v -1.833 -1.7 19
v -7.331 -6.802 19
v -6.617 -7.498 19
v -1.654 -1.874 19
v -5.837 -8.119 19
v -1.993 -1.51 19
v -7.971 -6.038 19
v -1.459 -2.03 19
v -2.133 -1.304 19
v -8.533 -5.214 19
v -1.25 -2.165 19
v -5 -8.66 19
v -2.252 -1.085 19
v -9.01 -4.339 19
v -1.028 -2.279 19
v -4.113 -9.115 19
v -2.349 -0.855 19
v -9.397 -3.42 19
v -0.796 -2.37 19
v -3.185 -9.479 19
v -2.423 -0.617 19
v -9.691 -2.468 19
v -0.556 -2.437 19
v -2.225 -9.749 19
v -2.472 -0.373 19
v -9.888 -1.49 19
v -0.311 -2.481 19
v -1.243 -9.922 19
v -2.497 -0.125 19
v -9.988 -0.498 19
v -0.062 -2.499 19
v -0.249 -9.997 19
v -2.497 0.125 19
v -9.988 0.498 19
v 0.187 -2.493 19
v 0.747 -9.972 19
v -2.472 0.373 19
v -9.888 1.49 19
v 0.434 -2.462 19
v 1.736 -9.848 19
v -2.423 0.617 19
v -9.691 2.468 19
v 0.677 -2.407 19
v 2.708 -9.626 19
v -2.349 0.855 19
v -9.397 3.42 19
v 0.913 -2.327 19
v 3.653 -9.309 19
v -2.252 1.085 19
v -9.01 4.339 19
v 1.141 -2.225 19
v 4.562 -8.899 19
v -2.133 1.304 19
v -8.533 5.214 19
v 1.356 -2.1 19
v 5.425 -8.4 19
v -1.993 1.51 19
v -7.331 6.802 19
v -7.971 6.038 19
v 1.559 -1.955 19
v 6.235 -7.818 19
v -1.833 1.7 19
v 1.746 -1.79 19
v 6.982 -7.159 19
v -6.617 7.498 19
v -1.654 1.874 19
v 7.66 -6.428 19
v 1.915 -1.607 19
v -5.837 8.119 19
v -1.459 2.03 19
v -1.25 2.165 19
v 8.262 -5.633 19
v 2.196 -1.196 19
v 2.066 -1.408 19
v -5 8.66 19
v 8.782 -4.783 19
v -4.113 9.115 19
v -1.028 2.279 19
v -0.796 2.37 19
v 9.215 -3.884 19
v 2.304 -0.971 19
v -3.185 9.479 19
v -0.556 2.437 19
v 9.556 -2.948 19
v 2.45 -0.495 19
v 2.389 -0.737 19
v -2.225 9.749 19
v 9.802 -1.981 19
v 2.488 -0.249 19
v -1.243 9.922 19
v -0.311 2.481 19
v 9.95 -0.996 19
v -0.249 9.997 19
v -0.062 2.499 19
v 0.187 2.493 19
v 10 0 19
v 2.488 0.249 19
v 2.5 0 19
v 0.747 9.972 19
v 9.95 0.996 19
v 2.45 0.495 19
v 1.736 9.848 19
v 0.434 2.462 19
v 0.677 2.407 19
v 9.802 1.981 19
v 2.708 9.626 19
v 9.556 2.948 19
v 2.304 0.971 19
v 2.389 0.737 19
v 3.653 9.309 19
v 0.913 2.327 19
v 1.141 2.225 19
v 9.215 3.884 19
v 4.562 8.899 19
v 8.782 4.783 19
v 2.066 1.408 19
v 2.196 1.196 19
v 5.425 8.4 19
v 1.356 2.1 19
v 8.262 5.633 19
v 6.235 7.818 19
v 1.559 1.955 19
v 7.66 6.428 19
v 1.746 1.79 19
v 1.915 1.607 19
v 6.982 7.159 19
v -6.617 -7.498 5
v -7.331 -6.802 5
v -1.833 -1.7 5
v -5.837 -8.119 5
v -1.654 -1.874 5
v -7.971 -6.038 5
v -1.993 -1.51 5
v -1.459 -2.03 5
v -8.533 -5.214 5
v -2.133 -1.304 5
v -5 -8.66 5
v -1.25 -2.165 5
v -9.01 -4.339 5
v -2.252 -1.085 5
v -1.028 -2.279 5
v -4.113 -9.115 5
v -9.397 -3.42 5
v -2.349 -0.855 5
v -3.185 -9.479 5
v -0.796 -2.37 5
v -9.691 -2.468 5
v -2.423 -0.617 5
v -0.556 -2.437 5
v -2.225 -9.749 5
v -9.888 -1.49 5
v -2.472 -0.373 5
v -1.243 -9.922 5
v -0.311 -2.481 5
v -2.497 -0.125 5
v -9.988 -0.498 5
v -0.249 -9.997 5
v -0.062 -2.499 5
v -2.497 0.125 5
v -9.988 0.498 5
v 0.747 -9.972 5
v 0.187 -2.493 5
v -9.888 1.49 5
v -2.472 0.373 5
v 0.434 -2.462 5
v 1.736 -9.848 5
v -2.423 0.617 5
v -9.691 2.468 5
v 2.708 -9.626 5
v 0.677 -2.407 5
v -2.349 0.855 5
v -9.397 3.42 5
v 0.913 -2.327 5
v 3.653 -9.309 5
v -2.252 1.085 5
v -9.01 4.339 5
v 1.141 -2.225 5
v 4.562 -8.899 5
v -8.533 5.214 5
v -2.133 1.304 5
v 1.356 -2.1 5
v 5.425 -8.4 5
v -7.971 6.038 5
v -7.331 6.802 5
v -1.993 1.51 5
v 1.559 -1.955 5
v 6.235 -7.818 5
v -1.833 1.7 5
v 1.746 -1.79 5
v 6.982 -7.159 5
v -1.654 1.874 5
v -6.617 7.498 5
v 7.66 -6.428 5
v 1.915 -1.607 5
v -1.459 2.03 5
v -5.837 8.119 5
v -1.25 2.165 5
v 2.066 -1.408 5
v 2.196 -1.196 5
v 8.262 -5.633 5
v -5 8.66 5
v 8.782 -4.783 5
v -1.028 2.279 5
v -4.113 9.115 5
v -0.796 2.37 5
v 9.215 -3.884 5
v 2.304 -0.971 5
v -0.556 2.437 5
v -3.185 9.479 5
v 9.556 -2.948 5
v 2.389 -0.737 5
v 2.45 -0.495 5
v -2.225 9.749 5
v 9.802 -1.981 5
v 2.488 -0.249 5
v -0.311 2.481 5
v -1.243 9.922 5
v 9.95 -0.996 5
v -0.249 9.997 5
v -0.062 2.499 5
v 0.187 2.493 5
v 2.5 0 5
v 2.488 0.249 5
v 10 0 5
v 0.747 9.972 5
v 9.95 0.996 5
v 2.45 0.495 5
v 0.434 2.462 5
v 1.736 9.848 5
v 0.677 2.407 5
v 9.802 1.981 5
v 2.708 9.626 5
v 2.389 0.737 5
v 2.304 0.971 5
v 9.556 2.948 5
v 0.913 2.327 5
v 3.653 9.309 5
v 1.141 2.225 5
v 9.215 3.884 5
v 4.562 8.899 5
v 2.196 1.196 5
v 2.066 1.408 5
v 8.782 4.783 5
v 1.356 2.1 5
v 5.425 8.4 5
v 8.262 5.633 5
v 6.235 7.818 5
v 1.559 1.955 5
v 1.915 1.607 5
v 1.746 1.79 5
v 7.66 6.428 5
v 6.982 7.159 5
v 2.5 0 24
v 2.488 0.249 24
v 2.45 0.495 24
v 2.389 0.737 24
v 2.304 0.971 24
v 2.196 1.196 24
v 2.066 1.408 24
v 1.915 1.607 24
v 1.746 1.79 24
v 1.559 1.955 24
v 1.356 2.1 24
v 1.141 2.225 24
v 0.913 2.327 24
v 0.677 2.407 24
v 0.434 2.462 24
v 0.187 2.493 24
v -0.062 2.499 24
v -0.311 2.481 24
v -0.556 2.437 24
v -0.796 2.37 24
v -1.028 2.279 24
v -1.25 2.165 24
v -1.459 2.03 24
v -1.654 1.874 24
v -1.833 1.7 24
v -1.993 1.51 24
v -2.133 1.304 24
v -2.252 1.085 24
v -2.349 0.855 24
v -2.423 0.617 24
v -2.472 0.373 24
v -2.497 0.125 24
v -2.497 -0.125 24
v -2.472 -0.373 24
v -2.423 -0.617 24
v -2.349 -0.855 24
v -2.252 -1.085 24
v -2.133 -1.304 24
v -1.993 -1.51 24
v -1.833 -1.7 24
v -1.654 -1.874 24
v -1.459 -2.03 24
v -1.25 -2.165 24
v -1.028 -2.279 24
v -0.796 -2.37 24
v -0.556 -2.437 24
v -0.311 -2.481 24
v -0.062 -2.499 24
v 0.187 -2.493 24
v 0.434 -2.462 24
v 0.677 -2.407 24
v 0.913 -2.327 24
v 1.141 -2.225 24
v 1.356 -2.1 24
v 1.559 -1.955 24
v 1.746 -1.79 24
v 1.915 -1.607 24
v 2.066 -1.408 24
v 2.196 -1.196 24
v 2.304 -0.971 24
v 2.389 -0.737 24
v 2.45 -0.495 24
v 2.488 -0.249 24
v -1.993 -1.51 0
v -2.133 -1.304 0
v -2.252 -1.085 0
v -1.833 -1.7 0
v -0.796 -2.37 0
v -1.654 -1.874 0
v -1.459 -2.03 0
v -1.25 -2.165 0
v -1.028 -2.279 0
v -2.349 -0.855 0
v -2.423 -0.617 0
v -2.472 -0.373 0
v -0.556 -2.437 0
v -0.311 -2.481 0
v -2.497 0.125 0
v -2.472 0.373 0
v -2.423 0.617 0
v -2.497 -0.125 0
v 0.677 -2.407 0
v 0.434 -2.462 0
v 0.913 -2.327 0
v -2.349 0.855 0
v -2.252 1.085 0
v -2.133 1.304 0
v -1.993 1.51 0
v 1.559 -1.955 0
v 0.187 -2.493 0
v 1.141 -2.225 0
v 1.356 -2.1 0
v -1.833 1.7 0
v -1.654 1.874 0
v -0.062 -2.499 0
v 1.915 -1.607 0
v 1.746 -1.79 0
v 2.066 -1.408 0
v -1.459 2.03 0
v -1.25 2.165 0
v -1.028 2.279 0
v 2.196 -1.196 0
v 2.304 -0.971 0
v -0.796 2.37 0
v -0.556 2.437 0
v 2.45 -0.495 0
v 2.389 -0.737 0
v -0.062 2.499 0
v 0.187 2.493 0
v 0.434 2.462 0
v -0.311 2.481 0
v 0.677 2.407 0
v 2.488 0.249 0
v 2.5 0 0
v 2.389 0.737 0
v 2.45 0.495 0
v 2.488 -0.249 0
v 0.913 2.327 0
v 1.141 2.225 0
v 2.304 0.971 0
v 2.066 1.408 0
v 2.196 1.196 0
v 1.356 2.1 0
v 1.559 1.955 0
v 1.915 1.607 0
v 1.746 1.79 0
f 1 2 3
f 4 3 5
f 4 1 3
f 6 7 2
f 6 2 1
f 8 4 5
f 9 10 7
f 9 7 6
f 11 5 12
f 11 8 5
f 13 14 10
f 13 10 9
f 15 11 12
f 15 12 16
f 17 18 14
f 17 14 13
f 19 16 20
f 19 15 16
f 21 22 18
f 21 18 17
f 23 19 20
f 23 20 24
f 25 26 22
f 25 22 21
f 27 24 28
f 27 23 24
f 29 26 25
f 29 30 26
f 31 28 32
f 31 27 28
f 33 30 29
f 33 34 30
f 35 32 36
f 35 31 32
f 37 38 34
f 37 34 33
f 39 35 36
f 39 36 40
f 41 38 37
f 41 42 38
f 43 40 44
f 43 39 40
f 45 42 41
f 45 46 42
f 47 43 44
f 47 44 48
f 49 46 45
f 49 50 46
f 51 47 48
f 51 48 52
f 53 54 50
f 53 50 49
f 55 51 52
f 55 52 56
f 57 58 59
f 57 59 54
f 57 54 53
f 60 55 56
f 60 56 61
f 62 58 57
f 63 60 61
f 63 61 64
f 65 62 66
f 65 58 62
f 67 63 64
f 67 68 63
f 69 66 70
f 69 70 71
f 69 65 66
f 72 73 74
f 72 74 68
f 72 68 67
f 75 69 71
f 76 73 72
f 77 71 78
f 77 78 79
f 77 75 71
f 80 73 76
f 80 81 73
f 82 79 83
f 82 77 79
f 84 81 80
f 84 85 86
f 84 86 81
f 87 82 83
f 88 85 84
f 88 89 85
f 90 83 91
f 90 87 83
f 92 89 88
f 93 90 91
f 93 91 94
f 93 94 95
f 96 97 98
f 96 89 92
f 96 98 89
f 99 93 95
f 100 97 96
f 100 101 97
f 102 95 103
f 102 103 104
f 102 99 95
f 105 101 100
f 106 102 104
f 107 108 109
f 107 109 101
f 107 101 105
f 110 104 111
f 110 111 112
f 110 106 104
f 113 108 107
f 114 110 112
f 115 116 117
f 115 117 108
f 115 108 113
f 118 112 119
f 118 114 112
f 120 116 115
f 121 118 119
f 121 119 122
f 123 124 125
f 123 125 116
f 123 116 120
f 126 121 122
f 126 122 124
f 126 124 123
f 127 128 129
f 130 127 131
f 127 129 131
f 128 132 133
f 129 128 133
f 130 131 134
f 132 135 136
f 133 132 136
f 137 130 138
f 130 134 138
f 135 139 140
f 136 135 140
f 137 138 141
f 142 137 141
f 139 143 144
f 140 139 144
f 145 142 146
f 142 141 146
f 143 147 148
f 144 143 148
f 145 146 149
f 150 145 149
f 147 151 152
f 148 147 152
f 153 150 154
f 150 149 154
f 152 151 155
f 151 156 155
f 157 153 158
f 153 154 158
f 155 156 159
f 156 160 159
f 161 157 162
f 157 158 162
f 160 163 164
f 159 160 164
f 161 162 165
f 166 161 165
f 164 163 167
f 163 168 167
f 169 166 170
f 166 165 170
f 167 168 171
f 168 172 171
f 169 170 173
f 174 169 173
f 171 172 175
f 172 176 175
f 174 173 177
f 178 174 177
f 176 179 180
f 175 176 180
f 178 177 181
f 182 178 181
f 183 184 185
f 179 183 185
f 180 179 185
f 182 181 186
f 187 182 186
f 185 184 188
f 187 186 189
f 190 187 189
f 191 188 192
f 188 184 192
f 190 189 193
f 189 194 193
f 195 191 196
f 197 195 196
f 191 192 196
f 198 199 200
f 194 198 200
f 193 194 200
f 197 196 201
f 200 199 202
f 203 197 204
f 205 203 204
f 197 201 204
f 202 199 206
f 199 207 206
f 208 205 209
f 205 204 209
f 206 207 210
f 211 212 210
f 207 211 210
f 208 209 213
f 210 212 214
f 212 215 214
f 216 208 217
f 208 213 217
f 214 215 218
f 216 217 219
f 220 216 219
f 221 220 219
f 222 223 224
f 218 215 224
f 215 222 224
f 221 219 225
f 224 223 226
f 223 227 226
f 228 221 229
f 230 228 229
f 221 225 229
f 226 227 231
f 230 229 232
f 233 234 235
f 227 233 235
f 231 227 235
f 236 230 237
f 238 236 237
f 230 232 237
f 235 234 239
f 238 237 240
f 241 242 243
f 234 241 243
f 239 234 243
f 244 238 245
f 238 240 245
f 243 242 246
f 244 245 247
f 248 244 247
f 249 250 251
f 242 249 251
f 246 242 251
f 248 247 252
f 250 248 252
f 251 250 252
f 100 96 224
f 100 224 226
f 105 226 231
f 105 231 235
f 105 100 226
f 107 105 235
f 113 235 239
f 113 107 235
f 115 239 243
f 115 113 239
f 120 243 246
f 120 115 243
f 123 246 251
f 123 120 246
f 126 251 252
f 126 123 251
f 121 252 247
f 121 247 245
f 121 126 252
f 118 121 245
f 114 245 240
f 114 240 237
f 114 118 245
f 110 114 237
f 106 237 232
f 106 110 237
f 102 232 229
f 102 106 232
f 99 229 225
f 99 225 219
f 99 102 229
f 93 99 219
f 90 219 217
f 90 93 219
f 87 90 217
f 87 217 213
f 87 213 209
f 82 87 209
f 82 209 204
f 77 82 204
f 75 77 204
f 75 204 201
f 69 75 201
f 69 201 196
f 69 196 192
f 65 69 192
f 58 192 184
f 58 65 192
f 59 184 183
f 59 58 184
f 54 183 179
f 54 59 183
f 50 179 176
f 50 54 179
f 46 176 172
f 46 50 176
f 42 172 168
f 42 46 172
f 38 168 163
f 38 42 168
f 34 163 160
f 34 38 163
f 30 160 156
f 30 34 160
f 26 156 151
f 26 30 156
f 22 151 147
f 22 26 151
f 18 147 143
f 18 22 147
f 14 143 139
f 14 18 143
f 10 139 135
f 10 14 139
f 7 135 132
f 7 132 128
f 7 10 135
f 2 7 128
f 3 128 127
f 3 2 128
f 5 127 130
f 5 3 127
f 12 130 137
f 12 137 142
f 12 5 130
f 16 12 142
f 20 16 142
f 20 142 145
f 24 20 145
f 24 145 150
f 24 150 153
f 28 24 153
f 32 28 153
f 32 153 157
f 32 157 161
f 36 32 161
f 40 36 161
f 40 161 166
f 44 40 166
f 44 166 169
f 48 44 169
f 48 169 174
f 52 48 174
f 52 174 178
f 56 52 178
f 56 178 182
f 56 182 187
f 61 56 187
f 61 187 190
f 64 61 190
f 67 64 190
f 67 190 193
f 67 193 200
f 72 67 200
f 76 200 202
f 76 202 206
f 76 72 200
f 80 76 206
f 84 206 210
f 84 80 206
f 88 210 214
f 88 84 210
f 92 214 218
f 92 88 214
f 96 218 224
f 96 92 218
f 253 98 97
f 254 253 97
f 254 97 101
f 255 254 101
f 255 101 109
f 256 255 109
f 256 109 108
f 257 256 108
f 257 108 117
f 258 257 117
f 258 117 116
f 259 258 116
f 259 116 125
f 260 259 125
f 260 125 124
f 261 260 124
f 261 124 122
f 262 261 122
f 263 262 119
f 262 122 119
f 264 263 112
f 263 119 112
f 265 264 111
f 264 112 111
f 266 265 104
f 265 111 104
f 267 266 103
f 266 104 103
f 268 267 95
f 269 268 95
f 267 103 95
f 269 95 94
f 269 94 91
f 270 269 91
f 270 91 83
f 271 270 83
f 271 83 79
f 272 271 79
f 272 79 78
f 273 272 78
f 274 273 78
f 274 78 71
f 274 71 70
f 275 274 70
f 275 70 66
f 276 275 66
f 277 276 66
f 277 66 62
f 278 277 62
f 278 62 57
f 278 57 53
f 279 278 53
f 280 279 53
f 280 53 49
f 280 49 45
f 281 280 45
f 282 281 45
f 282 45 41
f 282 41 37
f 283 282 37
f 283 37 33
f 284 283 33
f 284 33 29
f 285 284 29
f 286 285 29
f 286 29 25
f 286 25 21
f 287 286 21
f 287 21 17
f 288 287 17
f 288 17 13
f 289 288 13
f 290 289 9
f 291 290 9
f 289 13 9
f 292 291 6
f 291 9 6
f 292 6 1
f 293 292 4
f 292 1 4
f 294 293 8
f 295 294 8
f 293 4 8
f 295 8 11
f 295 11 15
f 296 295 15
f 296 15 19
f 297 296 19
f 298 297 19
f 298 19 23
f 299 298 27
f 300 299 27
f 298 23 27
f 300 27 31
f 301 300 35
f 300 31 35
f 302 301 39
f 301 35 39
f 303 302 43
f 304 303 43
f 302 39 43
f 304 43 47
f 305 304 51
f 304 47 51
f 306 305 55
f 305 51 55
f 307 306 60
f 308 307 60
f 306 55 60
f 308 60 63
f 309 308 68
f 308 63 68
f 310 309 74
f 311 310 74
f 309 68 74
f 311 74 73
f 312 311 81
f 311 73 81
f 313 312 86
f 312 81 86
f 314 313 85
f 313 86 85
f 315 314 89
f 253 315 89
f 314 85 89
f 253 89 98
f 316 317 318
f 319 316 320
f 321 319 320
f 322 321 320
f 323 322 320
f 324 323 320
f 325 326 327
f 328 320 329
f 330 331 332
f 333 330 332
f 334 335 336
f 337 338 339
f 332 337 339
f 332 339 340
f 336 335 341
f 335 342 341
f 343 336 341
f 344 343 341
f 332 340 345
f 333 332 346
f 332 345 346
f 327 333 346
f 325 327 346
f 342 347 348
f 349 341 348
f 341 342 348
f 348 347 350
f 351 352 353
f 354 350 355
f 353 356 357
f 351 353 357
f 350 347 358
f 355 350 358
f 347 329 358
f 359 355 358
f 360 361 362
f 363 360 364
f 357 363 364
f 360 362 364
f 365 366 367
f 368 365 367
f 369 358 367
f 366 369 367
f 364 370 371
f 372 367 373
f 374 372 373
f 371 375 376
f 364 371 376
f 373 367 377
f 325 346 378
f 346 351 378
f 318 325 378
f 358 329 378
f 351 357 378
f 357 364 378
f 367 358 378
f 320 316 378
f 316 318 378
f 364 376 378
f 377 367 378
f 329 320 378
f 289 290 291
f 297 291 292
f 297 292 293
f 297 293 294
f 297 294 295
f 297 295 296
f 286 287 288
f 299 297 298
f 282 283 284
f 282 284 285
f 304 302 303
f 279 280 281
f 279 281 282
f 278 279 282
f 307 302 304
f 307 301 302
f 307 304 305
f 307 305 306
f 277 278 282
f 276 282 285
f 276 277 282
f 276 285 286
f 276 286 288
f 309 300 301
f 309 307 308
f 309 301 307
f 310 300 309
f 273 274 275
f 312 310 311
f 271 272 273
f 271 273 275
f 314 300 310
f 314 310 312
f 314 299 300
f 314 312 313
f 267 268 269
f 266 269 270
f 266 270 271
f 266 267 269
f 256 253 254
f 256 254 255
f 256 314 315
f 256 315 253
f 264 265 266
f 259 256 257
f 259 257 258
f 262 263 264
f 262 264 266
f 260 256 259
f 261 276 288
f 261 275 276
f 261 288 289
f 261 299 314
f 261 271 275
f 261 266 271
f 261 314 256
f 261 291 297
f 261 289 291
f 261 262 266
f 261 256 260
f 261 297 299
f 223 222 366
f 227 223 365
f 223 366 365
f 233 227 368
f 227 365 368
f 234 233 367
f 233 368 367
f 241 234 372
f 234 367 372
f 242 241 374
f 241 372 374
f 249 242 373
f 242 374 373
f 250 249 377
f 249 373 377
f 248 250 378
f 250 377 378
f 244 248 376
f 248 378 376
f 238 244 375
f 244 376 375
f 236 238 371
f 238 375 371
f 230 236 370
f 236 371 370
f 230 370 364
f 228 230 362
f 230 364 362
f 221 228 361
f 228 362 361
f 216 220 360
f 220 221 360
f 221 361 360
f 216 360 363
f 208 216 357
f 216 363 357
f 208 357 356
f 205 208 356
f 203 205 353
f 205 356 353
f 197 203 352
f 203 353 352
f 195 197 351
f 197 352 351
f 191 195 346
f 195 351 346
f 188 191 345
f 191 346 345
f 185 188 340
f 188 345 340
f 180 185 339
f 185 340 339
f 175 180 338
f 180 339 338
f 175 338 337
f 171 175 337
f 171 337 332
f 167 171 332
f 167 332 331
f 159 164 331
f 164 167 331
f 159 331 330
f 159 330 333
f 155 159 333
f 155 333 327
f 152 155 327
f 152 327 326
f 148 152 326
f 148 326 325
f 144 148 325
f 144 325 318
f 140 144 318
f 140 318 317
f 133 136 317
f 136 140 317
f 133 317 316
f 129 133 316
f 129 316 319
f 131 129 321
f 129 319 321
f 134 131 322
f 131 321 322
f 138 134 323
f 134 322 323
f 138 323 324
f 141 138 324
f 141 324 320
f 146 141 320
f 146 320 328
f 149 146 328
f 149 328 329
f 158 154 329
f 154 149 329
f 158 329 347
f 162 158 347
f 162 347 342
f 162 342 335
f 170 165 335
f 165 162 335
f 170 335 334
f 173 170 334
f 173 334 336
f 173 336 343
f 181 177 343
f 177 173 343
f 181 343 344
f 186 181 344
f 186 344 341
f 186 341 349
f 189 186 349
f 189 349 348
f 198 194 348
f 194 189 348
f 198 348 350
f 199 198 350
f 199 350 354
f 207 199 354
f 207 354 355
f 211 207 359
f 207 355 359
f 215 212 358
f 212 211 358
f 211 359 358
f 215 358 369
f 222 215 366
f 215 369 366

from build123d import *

# Parameters (mm, degrees)
SKETCH1_R           = 2.5
BOSS_EXTRUDE1_DEPTH = 24
BOSS_EXTRUDE2_START = -5
SKETCH2_R           = 10
BOSS_EXTRUDE2_DEPTH = 14


with BuildPart() as part:
    # Sketch1 → Boss-Extrude1 (new body)
    with BuildSketch(Plane.XY):
        Circle(SKETCH1_R)
    extrude(amount=BOSS_EXTRUDE1_DEPTH)

    # Sketch2 → Boss-Extrude2 (add)
    with BuildSketch(Plane.XY.offset(24).offset(BOSS_EXTRUDE2_START)):
        Circle(SKETCH2_R)
    extrude(amount=-BOSS_EXTRUDE2_DEPTH)


solid = part.part
